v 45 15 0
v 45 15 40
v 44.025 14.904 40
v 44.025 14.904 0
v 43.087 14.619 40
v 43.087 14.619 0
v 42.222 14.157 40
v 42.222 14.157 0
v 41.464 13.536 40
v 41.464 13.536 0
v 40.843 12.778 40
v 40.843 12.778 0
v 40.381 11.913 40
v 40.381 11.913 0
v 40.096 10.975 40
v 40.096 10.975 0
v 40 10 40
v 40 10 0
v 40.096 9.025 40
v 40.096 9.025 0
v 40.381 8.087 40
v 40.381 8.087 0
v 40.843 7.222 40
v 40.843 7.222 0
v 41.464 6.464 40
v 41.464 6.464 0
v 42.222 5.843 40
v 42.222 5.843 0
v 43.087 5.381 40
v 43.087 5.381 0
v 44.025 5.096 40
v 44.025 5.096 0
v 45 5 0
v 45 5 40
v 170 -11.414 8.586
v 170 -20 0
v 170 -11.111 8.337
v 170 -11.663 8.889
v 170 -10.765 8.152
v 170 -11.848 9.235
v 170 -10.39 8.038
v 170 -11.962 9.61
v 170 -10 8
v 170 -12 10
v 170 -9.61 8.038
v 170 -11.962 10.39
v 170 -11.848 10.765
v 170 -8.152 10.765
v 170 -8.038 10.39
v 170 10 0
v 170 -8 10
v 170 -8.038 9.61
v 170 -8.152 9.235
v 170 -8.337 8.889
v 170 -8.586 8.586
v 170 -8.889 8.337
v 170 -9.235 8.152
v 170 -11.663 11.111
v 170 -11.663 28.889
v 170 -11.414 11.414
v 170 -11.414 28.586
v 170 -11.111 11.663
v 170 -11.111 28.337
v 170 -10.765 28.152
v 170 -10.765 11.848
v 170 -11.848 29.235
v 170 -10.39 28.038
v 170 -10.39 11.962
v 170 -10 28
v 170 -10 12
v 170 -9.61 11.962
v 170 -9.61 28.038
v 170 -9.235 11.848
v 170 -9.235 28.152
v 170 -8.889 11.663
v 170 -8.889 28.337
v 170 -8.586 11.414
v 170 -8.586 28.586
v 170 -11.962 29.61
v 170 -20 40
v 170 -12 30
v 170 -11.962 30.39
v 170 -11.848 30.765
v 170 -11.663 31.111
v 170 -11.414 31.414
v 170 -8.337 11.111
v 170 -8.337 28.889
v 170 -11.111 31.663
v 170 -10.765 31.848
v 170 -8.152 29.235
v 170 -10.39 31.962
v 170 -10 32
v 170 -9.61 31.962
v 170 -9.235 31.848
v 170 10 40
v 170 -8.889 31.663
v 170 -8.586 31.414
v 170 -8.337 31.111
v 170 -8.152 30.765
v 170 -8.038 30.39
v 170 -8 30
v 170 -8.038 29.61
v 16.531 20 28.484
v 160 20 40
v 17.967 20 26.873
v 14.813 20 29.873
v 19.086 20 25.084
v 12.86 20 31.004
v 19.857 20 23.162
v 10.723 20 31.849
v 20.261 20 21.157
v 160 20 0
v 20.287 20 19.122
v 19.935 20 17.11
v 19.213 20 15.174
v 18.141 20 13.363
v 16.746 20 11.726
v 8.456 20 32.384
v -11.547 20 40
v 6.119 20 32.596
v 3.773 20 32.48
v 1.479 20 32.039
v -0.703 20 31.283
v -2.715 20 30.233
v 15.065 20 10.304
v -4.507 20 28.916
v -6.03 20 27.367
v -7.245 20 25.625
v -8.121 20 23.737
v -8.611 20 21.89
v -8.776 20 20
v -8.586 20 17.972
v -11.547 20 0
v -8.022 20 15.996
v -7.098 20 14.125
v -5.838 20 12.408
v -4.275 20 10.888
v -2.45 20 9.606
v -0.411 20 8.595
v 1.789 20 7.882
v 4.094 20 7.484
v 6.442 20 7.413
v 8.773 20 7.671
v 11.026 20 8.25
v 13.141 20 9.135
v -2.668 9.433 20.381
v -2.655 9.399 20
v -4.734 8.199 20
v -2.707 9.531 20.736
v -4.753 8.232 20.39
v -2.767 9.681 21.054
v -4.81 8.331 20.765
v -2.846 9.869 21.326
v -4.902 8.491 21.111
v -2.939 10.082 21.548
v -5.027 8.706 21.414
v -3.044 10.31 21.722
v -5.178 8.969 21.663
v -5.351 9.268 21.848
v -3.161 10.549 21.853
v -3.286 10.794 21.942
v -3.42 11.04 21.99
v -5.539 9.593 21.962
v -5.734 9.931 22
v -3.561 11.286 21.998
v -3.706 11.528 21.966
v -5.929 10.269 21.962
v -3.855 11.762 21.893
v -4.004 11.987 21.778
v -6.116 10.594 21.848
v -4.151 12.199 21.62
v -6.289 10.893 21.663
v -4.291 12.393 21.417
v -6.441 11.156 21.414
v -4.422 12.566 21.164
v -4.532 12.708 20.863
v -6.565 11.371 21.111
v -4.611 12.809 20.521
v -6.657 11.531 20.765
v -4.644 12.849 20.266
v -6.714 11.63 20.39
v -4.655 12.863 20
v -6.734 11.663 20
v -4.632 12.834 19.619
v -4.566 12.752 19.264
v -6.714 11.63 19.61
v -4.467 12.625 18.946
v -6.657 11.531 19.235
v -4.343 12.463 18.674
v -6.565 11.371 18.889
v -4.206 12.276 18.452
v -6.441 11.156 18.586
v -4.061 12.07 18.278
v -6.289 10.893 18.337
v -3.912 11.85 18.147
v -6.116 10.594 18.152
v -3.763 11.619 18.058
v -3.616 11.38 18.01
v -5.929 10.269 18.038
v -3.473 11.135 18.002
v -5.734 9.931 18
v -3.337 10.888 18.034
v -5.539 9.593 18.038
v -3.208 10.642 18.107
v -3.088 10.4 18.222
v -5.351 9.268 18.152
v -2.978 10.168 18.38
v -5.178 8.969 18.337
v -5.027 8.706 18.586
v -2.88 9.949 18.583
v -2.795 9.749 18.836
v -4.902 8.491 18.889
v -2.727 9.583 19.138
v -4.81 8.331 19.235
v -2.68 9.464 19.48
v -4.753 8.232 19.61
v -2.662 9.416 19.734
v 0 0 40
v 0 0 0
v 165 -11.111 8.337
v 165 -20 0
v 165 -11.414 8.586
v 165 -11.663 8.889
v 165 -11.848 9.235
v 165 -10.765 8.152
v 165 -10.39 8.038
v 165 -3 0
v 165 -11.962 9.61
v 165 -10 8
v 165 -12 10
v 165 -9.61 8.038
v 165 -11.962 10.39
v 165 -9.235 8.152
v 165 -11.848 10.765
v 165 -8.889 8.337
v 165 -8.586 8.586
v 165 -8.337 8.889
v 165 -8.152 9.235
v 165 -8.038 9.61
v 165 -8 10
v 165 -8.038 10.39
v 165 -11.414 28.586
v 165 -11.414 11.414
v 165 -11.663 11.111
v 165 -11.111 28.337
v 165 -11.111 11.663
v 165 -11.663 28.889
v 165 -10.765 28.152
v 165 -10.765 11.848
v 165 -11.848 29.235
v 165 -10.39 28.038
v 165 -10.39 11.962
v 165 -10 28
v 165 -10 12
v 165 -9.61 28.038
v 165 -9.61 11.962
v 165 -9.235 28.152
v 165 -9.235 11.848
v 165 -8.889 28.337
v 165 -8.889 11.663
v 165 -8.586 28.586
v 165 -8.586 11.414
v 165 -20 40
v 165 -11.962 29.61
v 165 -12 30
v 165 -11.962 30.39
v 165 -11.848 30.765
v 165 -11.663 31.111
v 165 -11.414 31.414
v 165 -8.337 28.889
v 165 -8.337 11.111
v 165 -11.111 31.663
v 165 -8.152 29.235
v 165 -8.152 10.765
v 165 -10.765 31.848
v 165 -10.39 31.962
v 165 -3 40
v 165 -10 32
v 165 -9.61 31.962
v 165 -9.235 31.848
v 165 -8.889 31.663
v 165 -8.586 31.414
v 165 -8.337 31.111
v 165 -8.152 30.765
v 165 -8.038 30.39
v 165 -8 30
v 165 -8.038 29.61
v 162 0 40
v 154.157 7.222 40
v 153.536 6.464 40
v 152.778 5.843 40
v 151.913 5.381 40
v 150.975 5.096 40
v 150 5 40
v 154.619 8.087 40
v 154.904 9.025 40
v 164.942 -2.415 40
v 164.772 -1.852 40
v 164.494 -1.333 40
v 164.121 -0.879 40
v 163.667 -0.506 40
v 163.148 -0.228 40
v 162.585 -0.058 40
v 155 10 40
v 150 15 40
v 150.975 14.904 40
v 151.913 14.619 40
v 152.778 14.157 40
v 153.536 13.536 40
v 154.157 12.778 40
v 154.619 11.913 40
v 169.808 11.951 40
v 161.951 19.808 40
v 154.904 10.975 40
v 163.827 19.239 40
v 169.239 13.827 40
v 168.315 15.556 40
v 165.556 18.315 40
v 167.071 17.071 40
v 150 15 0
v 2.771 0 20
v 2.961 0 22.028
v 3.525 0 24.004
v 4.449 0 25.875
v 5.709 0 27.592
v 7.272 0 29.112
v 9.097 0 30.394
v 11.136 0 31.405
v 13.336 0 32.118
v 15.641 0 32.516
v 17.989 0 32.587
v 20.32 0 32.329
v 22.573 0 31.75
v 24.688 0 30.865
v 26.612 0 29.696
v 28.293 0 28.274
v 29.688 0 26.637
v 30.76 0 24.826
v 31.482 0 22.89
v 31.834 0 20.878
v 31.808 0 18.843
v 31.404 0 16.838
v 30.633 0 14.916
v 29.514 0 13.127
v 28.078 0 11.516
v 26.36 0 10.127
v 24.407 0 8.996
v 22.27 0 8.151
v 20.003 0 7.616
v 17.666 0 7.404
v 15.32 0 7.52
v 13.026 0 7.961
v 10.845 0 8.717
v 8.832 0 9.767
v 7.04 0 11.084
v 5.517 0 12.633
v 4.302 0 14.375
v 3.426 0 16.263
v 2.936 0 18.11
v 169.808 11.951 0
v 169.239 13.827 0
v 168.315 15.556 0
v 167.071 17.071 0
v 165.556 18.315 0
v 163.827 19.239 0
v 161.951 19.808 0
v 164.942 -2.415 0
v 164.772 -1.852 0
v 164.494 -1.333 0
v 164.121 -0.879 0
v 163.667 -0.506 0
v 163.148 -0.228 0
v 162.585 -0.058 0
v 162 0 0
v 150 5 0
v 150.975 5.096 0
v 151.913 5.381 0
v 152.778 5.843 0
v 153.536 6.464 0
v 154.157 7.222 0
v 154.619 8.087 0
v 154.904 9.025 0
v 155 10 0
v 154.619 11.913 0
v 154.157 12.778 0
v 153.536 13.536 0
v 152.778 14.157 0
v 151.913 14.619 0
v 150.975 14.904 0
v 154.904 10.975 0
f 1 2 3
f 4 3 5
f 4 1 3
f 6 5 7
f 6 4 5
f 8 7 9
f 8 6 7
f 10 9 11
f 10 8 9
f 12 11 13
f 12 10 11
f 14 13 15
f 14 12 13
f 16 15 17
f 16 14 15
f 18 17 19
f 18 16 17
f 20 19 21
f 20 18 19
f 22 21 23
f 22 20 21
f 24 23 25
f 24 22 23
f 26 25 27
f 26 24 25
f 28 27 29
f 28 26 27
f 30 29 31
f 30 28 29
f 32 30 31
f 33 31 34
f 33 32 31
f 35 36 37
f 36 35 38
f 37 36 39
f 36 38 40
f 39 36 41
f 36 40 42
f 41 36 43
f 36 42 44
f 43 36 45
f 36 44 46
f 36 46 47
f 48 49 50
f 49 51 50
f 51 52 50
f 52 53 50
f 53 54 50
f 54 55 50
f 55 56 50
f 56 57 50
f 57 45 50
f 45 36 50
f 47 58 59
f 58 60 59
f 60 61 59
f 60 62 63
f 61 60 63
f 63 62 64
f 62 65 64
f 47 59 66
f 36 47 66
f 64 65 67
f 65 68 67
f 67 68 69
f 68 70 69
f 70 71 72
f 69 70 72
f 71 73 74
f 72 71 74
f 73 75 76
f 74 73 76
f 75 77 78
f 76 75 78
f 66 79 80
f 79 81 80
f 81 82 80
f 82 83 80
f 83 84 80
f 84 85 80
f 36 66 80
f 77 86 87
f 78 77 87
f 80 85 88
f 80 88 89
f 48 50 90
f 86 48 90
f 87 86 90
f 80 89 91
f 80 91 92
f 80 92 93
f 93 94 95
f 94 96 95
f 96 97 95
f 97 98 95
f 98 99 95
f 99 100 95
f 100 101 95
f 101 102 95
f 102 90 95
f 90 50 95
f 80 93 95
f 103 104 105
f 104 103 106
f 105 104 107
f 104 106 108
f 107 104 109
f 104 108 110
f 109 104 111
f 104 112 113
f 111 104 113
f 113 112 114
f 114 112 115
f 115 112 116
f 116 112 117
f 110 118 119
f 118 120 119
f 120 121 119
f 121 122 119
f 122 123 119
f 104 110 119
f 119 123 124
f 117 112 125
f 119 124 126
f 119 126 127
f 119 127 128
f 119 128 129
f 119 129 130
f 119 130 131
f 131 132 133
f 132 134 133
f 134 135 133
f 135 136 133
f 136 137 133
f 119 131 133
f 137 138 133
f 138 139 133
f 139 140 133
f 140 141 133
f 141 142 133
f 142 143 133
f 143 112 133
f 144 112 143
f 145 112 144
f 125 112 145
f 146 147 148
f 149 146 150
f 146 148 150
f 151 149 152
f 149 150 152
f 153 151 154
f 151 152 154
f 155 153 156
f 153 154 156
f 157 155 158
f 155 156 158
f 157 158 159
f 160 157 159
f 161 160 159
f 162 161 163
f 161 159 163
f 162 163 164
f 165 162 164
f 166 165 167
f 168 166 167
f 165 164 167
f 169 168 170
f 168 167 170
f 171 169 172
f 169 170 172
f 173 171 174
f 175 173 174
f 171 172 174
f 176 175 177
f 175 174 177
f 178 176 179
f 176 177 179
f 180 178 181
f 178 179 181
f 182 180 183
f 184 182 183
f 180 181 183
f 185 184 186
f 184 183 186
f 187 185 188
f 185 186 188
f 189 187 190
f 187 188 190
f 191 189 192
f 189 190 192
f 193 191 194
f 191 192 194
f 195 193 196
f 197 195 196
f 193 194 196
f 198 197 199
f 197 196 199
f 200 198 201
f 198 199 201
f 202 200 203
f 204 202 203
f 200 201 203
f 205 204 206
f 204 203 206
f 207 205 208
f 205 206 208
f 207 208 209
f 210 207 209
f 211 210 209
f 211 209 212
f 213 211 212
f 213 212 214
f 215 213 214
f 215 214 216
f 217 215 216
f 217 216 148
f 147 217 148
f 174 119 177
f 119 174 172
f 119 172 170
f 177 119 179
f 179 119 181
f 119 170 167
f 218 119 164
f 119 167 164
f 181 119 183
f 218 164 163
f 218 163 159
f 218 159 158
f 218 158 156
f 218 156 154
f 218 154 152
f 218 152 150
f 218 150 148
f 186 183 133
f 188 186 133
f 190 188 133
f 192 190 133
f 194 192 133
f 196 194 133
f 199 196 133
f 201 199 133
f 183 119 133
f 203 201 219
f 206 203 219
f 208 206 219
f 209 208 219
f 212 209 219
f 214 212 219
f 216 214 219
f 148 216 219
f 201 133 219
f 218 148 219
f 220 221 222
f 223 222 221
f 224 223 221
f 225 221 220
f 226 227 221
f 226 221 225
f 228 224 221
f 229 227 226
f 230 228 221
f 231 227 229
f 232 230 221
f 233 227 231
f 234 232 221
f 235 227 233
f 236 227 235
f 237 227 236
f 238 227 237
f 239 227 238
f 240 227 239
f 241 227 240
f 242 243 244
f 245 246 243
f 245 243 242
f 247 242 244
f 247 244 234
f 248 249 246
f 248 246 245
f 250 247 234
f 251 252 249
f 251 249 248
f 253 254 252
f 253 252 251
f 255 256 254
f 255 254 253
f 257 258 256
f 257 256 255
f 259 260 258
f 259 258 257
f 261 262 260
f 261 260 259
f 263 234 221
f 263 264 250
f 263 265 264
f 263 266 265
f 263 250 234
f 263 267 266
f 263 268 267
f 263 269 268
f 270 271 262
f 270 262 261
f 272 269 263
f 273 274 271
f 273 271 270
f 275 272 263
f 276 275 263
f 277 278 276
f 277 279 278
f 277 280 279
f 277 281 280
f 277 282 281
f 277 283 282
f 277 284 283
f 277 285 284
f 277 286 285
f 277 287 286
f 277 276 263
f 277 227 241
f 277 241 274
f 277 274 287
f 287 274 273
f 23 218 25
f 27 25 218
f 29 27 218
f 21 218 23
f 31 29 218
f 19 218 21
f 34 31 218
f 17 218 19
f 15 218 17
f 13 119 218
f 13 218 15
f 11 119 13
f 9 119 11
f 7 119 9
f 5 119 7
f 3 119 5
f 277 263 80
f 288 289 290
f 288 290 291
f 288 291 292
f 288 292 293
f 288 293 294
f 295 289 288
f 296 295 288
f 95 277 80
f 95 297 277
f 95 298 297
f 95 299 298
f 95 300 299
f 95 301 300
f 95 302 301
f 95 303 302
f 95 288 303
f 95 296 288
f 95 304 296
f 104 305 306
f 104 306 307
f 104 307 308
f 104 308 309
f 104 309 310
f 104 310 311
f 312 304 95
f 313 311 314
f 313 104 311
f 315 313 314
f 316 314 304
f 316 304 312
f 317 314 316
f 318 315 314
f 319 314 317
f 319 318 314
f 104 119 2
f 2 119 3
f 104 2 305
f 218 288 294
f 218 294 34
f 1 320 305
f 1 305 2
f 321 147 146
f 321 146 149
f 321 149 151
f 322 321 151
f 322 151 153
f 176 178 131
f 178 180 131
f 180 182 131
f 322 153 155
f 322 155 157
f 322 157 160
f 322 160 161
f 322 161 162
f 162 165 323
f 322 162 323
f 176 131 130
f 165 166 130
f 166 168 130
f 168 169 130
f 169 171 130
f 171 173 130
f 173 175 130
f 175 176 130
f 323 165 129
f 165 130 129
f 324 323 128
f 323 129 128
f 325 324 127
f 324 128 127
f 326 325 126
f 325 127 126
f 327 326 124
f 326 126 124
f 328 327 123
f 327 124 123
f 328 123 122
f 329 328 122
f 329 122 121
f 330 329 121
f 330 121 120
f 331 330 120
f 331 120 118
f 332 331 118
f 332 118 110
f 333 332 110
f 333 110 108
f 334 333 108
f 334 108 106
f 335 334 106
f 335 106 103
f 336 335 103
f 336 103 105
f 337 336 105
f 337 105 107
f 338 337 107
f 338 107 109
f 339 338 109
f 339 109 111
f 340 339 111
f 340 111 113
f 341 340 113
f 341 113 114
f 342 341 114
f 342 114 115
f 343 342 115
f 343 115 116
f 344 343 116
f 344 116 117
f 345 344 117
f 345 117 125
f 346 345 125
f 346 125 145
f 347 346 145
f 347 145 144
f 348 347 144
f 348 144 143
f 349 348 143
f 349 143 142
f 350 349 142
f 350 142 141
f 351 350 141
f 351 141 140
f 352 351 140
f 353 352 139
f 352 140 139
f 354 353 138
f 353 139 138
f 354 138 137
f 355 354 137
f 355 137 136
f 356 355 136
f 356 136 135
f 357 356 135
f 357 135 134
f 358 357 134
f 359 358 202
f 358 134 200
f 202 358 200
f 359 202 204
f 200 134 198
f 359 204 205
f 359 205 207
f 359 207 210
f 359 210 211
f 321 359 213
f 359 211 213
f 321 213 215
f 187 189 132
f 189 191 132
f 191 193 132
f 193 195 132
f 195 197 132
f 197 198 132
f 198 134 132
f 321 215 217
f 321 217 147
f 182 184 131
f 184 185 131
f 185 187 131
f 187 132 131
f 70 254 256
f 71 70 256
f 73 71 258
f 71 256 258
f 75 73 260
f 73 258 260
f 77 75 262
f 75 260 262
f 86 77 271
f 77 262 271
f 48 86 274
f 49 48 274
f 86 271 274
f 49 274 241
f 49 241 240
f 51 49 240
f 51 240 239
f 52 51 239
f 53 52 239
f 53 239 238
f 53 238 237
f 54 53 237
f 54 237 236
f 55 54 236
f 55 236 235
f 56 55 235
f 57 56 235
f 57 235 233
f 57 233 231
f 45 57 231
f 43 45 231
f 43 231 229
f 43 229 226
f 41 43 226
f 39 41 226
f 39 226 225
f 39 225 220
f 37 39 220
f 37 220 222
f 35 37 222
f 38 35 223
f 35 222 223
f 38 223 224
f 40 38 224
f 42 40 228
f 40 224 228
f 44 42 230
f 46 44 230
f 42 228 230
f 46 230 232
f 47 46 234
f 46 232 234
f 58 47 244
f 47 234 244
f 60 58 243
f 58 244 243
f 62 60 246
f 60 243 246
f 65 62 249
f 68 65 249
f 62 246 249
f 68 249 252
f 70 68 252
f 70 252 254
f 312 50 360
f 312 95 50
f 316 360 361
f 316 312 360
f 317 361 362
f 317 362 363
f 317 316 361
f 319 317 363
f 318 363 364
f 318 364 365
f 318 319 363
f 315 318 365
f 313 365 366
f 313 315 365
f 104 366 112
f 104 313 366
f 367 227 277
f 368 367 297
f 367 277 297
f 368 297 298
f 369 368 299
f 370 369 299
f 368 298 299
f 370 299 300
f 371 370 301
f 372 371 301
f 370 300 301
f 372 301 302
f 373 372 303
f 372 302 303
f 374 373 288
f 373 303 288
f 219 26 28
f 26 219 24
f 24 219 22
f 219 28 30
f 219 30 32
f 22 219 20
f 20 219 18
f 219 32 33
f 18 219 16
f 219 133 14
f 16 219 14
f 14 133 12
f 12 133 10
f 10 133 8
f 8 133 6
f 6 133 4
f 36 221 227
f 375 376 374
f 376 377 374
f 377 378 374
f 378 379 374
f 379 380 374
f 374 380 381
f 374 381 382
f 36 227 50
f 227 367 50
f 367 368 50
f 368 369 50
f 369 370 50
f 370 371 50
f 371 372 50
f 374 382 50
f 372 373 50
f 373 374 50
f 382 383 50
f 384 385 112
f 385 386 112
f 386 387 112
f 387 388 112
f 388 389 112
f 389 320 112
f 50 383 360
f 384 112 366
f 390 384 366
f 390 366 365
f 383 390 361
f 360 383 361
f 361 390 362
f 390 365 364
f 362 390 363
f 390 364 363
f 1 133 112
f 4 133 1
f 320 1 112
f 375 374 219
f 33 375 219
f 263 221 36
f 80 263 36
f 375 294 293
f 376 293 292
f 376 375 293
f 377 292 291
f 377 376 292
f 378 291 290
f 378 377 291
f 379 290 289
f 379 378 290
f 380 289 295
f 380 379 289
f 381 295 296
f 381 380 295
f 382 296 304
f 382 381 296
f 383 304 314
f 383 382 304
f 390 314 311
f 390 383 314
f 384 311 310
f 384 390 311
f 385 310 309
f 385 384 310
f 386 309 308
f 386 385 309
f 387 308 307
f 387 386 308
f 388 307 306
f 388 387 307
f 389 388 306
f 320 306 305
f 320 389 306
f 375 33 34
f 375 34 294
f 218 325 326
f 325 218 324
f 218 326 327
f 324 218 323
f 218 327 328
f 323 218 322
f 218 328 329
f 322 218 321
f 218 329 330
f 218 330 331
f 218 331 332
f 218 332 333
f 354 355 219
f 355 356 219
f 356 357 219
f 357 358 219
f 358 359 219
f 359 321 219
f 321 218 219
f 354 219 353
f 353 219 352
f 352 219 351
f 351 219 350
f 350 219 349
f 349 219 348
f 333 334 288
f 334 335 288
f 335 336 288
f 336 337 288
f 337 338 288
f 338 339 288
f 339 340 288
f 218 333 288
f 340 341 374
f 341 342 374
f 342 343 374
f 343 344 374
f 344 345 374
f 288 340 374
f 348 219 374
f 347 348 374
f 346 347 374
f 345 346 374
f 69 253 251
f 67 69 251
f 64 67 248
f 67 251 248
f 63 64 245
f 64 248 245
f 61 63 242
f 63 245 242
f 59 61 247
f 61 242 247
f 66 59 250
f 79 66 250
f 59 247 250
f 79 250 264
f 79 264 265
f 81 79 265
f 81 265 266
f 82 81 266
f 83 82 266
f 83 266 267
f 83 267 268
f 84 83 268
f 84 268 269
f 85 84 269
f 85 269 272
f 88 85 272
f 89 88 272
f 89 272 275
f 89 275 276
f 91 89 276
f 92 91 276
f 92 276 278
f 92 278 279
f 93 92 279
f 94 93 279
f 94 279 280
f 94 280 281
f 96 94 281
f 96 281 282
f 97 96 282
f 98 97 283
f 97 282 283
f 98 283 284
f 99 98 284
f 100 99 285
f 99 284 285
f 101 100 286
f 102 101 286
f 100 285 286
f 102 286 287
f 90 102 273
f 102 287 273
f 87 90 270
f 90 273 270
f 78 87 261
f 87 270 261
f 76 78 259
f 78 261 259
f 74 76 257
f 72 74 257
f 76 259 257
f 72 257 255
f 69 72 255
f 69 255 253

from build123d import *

# Parameters (mm, degrees)
EXTRUDE_1_DEPTH          = 40
SKETCH_2_R               = 12.6
CUT_EXTRUDE_1_DEPTH      = 187.974102923
CUT_EXTRUDE_2_REACH      = 177.784
CUT_EXTRUDE_2_END_RADIUS = 12.6
SKETCH_3_R               = 2
SKETCH_4_W               = 5
SKETCH_4_H               = 40
EXTRUDE_2_DEPTH          = 20
SKETCH_5_R               = 2
CUT_EXTRUDE_3_DEPTH      = 183.123159192
FILLET_1_R               = 10
FILLET_2_R               = 3
CUT_EXTRUDE_4_DEPTH      = 176.783958324


with BuildPart() as part:
    # 草图1 → 凸台-拉伸1 (new body)
    with BuildSketch(Plane.XY):
        Polygon((0, 0), (170, 0), (170, 20), (-11.547005384, 20), align=None)
    extrude(amount=EXTRUDE_1_DEPTH)

    # 草图2 → 切除-拉伸1 (cut, through all)
    with BuildSketch(Plane(origin=(-11.547005384, 20, 0), x_dir=(0, 0, -1), z_dir=(-0.4999999999999949, 0.8660254037844416, 0))):
        with Locations(Location((-20, -15, 0), (0, 0, 90))):
            Circle(SKETCH_2_R)
    extrude(amount=-CUT_EXTRUDE_1_DEPTH, mode=Mode.SUBTRACT)

    # 切除-拉伸2: up to this cylinder (the profile starts outside it)
    cut_extrude_2_end = Plane(origin=(7.25676472, 17.430914806, 20), z_dir=(-0.4999999999999949, 0.8660254037844416, 0)) * Cylinder(CUT_EXTRUDE_2_END_RADIUS, 381.768, mode=Mode.PRIVATE)
    # 草图3 → 切除-拉伸2 (cut, up to the surface)
    with BuildSketch(Plane(origin=(0, 0, 0), x_dir=(0, 0, 1), z_dir=(-0.8660254037844417, -0.4999999999999949, 0)), mode=Mode.PRIVATE) as cut_extrude_2_sk1:
        with Locations(Location((20, 11.46723296, 0), (0, 0, 270))):
            Circle(SKETCH_3_R)
    cut_extrude_2_tool1 = extrude(cut_extrude_2_sk1.sketch, amount=-CUT_EXTRUDE_2_REACH, mode=Mode.PRIVATE) - cut_extrude_2_end
    add(cut_extrude_2_tool1.solids().sort_by_distance((-5.733616, 9.930915, 20))[0], mode=Mode.SUBTRACT)

    # 草图4 → 凸台-拉伸2 (add)
    with BuildSketch(Plane.XZ):
        with Locations((167.5, 20)):
            Rectangle(SKETCH_4_W, SKETCH_4_H)
    extrude(amount=EXTRUDE_2_DEPTH)

    # 草图5 → 切除-拉伸3 (cut, through all)
    with BuildSketch(Plane.ZY.offset(-165)):
        with Locations((10, -10)):
            Circle(SKETCH_5_R)
        with Locations(Location((30, -10, 0), (0, 0, 180))):
            Circle(SKETCH_5_R)
    extrude(amount=-CUT_EXTRUDE_3_DEPTH, mode=Mode.SUBTRACT)

    # 圆角1
    fillet_1_edges = [part.edges().sort_by_distance(p)[0] for p in [
        (170, 20, 20),
    ]]
    fillet(fillet_1_edges, radius=FILLET_1_R)

    # 圆角2
    fillet_2_edges = [part.edges().sort_by_distance(p)[0] for p in [
        (165, 0, 20),
    ]]
    fillet(fillet_2_edges, radius=FILLET_2_R)

    # 草图6 → 切除-拉伸4 (cut, through all)
    with BuildSketch(Plane(origin=(0, 0, 0), x_dir=(-1, 0, 0), z_dir=(0, 0, -1))):
        with BuildLine():
            Line((-150, 15), (-45, 15))
            ThreePointArc((-45, 15), (-40, 10), (-45, 5))
            Line((-45, 5), (-150, 5))
            ThreePointArc((-150, 5), (-155, 10), (-150, 15))
        make_face()
    extrude(amount=-CUT_EXTRUDE_4_DEPTH, mode=Mode.SUBTRACT)


solid = part.part
